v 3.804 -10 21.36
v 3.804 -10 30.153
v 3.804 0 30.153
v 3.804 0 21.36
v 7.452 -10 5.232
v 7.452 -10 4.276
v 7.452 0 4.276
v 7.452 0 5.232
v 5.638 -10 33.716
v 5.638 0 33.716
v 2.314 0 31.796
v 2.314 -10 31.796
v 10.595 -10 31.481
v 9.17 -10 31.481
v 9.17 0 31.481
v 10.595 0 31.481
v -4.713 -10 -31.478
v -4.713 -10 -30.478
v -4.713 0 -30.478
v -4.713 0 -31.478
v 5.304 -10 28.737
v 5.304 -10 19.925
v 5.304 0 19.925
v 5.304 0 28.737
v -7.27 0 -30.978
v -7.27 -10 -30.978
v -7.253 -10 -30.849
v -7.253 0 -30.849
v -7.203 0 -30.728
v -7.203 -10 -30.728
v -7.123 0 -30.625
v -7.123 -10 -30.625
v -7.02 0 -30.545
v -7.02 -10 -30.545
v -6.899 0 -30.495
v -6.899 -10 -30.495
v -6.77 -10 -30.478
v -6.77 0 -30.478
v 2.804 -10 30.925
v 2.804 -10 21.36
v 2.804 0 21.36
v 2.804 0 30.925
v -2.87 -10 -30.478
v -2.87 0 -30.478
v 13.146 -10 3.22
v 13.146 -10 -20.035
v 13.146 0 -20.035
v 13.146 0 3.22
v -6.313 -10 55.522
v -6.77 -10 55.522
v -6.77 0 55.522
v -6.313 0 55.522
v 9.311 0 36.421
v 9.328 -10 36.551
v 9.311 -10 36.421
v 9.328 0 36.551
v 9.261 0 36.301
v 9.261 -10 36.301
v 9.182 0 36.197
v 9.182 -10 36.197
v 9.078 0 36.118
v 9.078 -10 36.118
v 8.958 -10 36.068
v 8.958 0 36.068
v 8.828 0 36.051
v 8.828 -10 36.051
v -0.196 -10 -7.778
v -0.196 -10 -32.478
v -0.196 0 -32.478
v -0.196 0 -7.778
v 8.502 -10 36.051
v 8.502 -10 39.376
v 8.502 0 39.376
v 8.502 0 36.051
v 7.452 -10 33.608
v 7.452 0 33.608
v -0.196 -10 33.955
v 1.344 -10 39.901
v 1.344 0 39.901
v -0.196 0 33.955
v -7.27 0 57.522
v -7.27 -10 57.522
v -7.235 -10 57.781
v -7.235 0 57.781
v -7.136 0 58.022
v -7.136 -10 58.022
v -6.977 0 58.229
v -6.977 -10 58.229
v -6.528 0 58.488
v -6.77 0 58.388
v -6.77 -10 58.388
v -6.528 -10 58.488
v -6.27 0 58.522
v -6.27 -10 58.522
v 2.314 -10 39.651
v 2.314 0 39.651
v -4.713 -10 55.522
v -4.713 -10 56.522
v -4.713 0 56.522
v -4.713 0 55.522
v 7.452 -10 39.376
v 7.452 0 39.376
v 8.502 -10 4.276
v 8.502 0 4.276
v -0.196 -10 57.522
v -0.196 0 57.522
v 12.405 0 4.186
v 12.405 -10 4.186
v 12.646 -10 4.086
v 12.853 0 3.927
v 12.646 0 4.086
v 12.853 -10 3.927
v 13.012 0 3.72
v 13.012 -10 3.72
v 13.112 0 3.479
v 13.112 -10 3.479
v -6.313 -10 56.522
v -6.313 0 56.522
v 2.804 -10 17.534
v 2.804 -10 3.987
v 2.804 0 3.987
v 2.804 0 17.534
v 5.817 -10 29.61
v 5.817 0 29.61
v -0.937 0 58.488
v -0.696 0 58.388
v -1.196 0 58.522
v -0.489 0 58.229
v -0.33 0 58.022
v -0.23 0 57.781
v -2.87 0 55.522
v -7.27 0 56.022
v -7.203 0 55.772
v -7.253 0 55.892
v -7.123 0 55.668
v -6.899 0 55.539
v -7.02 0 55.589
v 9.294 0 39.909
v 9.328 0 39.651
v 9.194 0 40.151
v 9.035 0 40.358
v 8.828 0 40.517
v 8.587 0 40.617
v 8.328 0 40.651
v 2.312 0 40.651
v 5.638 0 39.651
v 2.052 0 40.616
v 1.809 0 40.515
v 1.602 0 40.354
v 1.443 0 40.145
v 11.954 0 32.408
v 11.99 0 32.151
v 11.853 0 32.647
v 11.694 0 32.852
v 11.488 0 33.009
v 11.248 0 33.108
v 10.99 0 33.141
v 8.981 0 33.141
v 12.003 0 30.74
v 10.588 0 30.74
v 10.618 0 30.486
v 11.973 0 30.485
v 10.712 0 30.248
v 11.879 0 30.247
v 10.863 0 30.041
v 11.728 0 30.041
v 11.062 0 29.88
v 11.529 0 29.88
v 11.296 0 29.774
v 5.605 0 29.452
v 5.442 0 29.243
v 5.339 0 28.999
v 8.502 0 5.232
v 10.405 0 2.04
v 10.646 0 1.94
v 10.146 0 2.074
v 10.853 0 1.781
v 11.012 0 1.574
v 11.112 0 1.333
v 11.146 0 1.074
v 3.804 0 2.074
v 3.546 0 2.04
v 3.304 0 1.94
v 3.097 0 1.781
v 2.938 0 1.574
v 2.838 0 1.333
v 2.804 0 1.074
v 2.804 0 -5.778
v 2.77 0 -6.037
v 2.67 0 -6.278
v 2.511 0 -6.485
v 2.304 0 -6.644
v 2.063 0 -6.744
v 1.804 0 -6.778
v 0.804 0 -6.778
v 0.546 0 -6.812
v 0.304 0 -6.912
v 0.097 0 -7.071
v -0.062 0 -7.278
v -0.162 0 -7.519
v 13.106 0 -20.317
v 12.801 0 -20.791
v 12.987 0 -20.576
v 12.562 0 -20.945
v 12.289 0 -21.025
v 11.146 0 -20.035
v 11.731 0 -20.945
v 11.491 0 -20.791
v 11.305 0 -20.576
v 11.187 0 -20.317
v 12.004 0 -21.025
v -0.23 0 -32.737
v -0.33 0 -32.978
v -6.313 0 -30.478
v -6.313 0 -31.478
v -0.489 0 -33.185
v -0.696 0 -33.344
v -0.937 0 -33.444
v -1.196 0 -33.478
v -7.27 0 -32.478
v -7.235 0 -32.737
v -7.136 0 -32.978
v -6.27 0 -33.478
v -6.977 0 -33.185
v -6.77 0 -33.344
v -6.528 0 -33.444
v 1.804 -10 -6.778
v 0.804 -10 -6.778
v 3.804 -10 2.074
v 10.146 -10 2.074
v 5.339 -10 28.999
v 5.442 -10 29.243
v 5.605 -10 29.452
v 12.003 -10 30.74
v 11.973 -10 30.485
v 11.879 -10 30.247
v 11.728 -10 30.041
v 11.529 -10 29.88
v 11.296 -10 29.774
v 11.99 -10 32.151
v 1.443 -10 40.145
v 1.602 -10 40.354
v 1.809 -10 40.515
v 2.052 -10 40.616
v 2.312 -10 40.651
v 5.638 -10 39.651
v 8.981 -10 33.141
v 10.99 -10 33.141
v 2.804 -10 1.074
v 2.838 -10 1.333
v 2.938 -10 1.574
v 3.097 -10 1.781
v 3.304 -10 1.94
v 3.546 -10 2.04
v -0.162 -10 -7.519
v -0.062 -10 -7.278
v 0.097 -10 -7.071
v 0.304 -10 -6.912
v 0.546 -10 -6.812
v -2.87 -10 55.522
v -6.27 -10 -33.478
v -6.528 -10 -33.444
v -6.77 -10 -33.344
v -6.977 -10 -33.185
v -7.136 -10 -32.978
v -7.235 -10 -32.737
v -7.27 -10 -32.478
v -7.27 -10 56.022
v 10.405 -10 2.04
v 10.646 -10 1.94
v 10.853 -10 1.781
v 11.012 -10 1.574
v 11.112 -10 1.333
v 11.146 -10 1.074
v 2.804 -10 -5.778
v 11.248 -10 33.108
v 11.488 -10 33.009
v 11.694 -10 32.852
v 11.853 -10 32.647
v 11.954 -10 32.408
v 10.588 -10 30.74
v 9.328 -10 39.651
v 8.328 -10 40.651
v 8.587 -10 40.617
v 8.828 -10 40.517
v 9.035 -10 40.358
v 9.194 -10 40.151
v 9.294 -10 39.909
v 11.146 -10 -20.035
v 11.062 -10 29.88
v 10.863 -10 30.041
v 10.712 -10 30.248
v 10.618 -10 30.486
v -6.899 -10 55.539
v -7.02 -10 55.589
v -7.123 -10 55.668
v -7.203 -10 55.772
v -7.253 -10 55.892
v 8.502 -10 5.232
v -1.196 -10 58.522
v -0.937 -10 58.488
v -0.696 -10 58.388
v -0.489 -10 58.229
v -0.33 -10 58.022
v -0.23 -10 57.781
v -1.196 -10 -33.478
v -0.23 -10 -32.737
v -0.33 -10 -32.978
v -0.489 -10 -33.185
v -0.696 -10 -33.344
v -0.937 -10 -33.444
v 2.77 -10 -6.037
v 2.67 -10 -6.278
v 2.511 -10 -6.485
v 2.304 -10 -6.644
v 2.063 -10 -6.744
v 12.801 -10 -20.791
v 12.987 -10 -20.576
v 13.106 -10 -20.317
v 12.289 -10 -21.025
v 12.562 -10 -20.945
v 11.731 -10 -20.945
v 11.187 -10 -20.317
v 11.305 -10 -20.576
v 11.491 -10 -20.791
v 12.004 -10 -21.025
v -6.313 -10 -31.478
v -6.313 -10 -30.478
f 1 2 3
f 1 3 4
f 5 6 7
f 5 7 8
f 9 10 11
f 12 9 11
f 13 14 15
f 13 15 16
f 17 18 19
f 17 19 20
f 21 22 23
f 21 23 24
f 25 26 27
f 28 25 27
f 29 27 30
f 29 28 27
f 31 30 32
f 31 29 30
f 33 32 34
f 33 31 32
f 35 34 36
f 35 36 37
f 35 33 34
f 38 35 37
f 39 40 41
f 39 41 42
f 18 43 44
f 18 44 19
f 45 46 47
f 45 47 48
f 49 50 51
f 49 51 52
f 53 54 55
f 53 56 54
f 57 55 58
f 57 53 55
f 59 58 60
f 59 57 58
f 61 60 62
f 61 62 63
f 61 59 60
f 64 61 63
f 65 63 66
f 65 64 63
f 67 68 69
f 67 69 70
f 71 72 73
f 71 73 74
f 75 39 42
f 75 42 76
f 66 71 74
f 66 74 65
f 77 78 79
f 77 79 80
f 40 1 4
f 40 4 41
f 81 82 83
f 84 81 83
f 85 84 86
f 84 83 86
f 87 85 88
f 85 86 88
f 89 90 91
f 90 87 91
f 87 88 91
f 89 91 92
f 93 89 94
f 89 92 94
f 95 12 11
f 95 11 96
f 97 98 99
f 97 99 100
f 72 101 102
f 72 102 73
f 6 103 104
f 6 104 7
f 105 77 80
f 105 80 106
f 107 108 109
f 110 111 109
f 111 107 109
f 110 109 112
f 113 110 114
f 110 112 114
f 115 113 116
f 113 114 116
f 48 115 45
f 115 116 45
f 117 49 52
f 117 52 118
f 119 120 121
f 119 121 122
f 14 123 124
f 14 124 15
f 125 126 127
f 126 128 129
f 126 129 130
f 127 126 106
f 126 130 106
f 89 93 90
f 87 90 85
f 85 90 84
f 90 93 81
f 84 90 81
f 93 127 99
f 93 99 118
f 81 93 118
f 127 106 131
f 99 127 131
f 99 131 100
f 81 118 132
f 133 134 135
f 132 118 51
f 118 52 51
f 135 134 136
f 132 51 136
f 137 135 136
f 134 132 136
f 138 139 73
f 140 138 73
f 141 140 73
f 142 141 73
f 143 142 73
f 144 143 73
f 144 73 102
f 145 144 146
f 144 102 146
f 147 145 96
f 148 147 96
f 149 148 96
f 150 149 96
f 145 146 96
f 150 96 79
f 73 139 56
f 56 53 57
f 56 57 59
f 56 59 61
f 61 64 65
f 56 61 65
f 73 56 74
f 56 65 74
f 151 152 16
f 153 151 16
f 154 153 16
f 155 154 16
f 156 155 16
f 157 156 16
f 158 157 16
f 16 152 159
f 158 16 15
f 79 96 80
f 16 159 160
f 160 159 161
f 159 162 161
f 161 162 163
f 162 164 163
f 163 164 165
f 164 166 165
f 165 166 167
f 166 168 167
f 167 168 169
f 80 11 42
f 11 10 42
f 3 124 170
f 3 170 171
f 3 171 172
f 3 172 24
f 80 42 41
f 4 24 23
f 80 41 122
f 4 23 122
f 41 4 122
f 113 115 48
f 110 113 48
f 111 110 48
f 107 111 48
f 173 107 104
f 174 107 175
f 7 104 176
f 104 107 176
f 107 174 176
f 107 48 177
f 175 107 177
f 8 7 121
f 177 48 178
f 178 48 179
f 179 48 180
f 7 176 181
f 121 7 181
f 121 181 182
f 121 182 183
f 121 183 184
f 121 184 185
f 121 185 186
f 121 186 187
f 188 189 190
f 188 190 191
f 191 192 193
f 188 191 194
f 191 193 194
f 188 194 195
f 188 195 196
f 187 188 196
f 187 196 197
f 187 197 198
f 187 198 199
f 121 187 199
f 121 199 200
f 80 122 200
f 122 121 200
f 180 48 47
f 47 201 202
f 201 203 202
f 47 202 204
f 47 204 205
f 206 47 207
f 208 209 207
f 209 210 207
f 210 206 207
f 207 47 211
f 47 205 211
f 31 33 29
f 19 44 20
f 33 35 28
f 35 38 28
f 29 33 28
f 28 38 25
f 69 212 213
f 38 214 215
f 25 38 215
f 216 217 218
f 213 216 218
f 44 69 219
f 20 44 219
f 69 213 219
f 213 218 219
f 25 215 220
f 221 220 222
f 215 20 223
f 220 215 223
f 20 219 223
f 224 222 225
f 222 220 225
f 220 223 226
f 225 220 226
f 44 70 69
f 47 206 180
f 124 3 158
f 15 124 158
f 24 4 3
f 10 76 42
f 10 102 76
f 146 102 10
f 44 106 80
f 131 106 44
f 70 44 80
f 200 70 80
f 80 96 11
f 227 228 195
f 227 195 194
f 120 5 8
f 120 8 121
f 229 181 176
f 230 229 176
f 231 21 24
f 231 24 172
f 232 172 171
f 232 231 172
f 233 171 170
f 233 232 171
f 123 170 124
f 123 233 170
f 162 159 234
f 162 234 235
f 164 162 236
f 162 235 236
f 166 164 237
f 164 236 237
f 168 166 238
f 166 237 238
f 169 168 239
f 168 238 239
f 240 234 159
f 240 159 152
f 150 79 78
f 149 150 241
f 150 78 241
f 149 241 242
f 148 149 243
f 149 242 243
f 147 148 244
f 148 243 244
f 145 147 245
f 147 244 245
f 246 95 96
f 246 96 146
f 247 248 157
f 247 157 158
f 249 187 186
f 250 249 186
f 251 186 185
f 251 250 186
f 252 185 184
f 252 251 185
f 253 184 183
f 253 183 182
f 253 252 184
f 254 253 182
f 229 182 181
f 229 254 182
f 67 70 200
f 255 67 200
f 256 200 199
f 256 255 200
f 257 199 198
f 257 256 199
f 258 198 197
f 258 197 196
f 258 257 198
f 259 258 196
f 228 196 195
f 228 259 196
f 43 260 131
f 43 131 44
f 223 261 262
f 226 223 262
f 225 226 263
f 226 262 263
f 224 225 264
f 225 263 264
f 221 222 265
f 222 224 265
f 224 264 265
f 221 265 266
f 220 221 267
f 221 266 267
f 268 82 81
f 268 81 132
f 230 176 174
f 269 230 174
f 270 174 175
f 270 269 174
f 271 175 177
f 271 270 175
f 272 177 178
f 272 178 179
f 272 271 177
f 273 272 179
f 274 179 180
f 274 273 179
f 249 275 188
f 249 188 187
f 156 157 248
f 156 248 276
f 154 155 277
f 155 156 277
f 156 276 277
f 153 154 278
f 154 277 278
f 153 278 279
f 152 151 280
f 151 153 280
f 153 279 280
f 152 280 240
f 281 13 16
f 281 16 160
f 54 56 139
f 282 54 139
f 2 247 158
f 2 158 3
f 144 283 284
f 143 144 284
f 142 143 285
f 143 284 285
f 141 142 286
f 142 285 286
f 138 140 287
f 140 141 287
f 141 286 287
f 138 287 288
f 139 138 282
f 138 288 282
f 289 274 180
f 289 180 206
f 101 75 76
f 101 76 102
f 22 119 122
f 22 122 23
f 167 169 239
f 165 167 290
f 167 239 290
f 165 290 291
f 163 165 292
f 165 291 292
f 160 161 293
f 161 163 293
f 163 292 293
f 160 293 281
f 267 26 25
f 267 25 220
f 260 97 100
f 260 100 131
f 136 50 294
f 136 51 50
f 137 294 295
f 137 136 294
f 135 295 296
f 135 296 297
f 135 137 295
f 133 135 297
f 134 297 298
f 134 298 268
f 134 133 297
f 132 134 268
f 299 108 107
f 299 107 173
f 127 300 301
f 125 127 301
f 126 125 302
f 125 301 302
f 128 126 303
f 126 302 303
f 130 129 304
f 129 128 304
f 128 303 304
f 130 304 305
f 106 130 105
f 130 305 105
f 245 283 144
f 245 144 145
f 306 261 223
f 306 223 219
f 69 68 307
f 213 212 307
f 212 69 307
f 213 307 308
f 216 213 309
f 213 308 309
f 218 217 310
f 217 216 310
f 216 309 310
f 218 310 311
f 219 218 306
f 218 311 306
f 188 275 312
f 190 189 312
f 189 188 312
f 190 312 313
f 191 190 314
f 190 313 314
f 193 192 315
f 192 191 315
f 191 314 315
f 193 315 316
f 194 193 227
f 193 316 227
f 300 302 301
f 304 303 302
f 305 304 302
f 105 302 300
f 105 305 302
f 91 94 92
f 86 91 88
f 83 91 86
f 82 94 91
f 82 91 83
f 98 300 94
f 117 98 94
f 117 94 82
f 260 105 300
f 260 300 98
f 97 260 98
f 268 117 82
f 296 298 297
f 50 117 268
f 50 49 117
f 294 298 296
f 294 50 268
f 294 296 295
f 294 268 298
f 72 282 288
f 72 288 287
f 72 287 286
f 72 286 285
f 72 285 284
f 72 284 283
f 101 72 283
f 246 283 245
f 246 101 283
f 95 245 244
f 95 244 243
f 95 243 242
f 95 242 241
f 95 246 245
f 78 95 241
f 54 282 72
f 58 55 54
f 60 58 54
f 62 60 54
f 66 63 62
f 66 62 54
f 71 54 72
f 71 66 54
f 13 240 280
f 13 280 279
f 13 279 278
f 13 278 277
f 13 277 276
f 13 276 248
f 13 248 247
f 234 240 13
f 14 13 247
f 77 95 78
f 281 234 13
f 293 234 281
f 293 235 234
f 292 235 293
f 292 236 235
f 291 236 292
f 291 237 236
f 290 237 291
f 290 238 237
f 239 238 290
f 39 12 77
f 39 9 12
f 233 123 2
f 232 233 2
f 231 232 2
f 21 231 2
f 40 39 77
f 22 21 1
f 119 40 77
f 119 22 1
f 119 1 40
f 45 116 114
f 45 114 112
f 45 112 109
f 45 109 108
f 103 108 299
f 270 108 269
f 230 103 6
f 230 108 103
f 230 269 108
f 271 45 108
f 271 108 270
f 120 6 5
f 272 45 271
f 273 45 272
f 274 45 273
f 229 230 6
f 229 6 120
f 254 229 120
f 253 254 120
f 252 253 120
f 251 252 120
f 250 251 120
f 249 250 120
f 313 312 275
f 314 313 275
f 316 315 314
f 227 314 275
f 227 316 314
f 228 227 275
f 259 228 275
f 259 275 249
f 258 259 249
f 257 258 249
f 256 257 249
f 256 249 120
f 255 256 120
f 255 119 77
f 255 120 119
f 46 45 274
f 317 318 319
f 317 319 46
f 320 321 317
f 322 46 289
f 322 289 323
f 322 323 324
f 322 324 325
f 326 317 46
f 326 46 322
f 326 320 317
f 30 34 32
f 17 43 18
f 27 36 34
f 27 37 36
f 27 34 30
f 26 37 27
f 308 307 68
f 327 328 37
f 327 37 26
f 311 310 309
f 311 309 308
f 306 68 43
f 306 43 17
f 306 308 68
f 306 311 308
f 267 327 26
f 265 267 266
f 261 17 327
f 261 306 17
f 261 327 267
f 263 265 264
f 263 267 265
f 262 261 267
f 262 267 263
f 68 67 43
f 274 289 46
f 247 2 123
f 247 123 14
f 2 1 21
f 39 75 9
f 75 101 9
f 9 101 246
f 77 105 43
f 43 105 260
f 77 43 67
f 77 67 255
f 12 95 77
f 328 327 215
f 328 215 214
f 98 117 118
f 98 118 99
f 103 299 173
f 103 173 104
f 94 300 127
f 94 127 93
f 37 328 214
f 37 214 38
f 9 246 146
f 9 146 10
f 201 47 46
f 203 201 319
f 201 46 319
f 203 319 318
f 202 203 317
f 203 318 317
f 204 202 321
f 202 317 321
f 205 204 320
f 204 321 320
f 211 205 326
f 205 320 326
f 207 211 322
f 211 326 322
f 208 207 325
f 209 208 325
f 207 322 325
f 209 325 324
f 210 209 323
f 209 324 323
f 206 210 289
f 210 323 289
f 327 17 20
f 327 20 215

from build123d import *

# Parameters (mm, degrees)
BOSS_EXTRUDE1_DEPTH = 10
FILLET1_R           = 1
FILLET2_R           = 0.5


with BuildPart() as part:
    # Sketch1 → Boss-Extrude1 (new body)
    with BuildSketch(Plane.XZ.offset(10)):
        Polygon((2.804347826, 17.533503473), (5.304347826, 19.924807821), (5.304347826, 29.324187975), (9.169667061, 31.480524519), (10.595176157, 31.480524519), (10.577761024, 29.730396695), (12.012614665, 29.730396695), (11.981340388, 33.141498149), (8.981340388, 33.141498149), (3.804347826, 30.1525601), (3.804347826, 21.359590429), (2.804347826, 21.359590429), (2.804347826, 30.924807821), (7.452279989, 33.608292706), (7.452279989, 39.375896583), (8.502279989, 39.375896583), (8.502279989, 36.050651768), (9.328366946, 36.050651768), (9.328366946, 40.650651768), (1.538219203, 40.650651768), (-0.195652174, 33.954999595), (-0.195652174, 58.52173913), (-7.269565217, 58.52173913), (-7.269565217, 55.52173913), (-6.313043478, 55.52173913), (-6.313043478, 56.52173913), (-4.713043478, 56.52173913), (-4.713043478, 55.52173913), (-2.869565217, 55.52173913), (-2.869565217, 4.387220823), (-2.869565217, -9.434782609), (-2.869565217, -30.47826087), (-4.713043478, -30.47826087), (-4.713043478, -31.47826087), (-6.313043478, -31.47826087), (-6.313043478, -30.47826087), (-7.269565217, -30.47826087), (-7.269565217, -33.47826087), (-0.195652174, -33.47826087), (-0.195652174, -6.777713361), (2.804347826, -6.777713361), (2.804347826, 2.073965174), (11.146243443, 2.073965174), (11.146243443, -21.034930407), (13.146243443, -21.034930407), (13.146243443, 3.987008652), (8.502279989, 5.232418322), (8.502279989, 4.275896583), (7.452279989, 4.275896583), (7.452279989, 5.232418322), (2.804347826, 3.987008652), align=None)
        Polygon((2.31416262, 31.796499798), (2.31416262, 39.650651768), (5.638358328, 39.650651768), (5.638358328, 33.715725085), align=None, mode=Mode.SUBTRACT)
    extrude(amount=-BOSS_EXTRUDE1_DEPTH)

    # Fillet1
    # the kernel refuses this fillet: 1 mm, written as the material it adds along each edge
    with BuildSketch(Plane(origin=(2.804347826, -10, 2.073965174), x_dir=(1, 0, 0), z_dir=(0, 1, 0)), Plane(origin=(-0.195652174, -10, -6.777713361), x_dir=(1, 0, 0), z_dir=(0, 1, 0)), Plane(origin=(11.146243443, -10, 2.073965174), x_dir=(0, 0, -1), z_dir=(0, 1, 0))) as fillet1_piece_1:
        with BuildLine():
            CenterArc((FILLET1_R, FILLET1_R), FILLET1_R, 180, 90)
            Line((0, FILLET1_R), (0, 0))
            Line((0, 0), (FILLET1_R, 0))
        make_face()
    extrude(amount=10)
    with BuildSketch(Plane(origin=(5.304347826, -10, 29.324187975), x_dir=(0.8732987298442874, 0, 0.48718510696895734), z_dir=(0, 1, 0))) as fillet1_piece_2:
        with BuildLine():
            CenterArc((FILLET1_R * 0.587215892462, FILLET1_R), FILLET1_R, 209.155734131, 60.844265869)
            Line((-FILLET1_R * 0.286082837383, FILLET1_R * 0.512814893031), (0, 0))
            Line((0, 0), (FILLET1_R * 0.587215892462, 0))
        make_face()
    extrude(amount=10)
    # the kernel refuses this fillet: 1 mm, written as the material it takes off along each edge
    with BuildSketch(Plane(origin=(11.981340388, -12.47718412, 33.141498149), x_dir=(0.009167995584995172, 0, -0.9999579730453443), z_dir=(0, 1, 0))) as fillet1_2_piece_1:
        with BuildLine():
            CenterArc((FILLET1_R * 0.990873647817, FILLET1_R), FILLET1_R, 180.525294812, 89.474705188)
            Line((-FILLET1_R * 0.00908432522847, FILLET1_R * 0.990832004415), (0, 0))
            Line((0, 0), (FILLET1_R * 0.990873647817, 0))
        make_face()
    extrude(amount=14.954368239, mode=Mode.SUBTRACT)
    with BuildSketch(Plane(origin=(10.577761024, -12.525000715, 29.730396695), x_dir=(0.009950285545768225, 0, 0.9999504946833906), z_dir=(0, 1, 0))) as fillet1_2_piece_2:
        with BuildLine():
            CenterArc((FILLET1_R * 1.01000028593, FILLET1_R), FILLET1_R, 179.429881225, 90.570118775)
            Line((FILLET1_R * 0.0100497912463, FILLET1_R * 1.00995028555), (0, 0))
            Line((0, 0), (FILLET1_R * 1.01000028593, 0))
        make_face()
    extrude(amount=15.05000143, mode=Mode.SUBTRACT)
    with BuildSketch(Plane(origin=(12.012614665, -12.523026024, 29.730396695), x_dir=(-1, 0, 0), z_dir=(0, 1, 0))) as fillet1_2_piece_3:
        with BuildLine():
            CenterArc((FILLET1_R * 1.00921040963, FILLET1_R), FILLET1_R, 179.474705188, 90.525294812)
            Line((FILLET1_R * 0.00925243657978, FILLET1_R * 1.00916799558), (0, 0))
            Line((0, 0), (FILLET1_R * 1.00921040963, 0))
        make_face()
    extrude(amount=15.046052048, mode=Mode.SUBTRACT)
    with BuildSketch(Plane(origin=(13.146243443, -12.5, -21.034930407), x_dir=(-1, 0, 0), z_dir=(0, 1, 0)), Plane(origin=(2.804347826, -12.5, -6.777713361), x_dir=(-1, 0, 0), z_dir=(0, 1, 0)), Plane(origin=(11.146243443, -12.5, -21.034930407), x_dir=(0, 0, 1), z_dir=(0, 1, 0)), Plane(origin=(-0.195652174, -12.5, -33.47826087), x_dir=(-1, 0, 0), z_dir=(0, 1, 0)), Plane(origin=(-7.269565217, -12.5, -33.47826087), x_dir=(0, 0, 1), z_dir=(0, 1, 0)), Plane(origin=(-7.269565217, -12.5, 58.52173913), x_dir=(1, 0, 0), z_dir=(0, 1, 0)), Plane(origin=(-0.195652174, -12.5, 58.52173913), x_dir=(0, 0, -1), z_dir=(0, 1, 0)), Plane(origin=(9.328366946, -12.5, 40.650651768), x_dir=(0, 0, -1), z_dir=(0, 1, 0))) as fillet1_2_piece_4:
        with BuildLine():
            CenterArc((FILLET1_R, FILLET1_R), FILLET1_R, 180, 90)
            Line((0, FILLET1_R), (0, 0))
            Line((0, 0), (FILLET1_R, 0))
        make_face()
    extrude(amount=15, mode=Mode.SUBTRACT)
    with BuildSketch(Plane(origin=(13.146243443, -11.917893225, 3.987008652), x_dir=(0, 0, -1), z_dir=(0, 1, 0))) as fillet1_2_piece_5:
        with BuildLine():
            CenterArc((FILLET1_R * 0.76715728997, FILLET1_R), FILLET1_R, 195.012240475, 74.987759525)
            Line((-FILLET1_R * 0.198713221058, FILLET1_R * 0.740974603702), (0, 0))
            Line((0, 0), (FILLET1_R * 0.76715728997, 0))
        make_face()
    extrude(amount=13.83578645, mode=Mode.SUBTRACT)
    with BuildSketch(Plane(origin=(1.538219203, -11.935074959, 40.650651768), x_dir=(1, 0, 0), z_dir=(0, 1, 0))) as fillet1_2_piece_6:
        with BuildLine():
            CenterArc((FILLET1_R * 0.774029983779, FILLET1_R), FILLET1_R, 194.518109178, 75.481890822)
            Line((-FILLET1_R * 0.19403847194, FILLET1_R * 0.749314011077), (0, 0))
            Line((0, 0), (FILLET1_R * 0.774029983779, 0))
        make_face()
    extrude(amount=13.870149919, mode=Mode.SUBTRACT)

    # Fillet2
    fillet2_edges = [part.edges().sort_by_distance(p)[0] for p in [
        (-7.269565217, -5, -30.47826087),
        (-7.269565217, -5, 55.52173913),
        (9.328366946, -5, 36.050651768),
    ]]
    fillet(fillet2_edges, radius=FILLET2_R)


solid = part.part
